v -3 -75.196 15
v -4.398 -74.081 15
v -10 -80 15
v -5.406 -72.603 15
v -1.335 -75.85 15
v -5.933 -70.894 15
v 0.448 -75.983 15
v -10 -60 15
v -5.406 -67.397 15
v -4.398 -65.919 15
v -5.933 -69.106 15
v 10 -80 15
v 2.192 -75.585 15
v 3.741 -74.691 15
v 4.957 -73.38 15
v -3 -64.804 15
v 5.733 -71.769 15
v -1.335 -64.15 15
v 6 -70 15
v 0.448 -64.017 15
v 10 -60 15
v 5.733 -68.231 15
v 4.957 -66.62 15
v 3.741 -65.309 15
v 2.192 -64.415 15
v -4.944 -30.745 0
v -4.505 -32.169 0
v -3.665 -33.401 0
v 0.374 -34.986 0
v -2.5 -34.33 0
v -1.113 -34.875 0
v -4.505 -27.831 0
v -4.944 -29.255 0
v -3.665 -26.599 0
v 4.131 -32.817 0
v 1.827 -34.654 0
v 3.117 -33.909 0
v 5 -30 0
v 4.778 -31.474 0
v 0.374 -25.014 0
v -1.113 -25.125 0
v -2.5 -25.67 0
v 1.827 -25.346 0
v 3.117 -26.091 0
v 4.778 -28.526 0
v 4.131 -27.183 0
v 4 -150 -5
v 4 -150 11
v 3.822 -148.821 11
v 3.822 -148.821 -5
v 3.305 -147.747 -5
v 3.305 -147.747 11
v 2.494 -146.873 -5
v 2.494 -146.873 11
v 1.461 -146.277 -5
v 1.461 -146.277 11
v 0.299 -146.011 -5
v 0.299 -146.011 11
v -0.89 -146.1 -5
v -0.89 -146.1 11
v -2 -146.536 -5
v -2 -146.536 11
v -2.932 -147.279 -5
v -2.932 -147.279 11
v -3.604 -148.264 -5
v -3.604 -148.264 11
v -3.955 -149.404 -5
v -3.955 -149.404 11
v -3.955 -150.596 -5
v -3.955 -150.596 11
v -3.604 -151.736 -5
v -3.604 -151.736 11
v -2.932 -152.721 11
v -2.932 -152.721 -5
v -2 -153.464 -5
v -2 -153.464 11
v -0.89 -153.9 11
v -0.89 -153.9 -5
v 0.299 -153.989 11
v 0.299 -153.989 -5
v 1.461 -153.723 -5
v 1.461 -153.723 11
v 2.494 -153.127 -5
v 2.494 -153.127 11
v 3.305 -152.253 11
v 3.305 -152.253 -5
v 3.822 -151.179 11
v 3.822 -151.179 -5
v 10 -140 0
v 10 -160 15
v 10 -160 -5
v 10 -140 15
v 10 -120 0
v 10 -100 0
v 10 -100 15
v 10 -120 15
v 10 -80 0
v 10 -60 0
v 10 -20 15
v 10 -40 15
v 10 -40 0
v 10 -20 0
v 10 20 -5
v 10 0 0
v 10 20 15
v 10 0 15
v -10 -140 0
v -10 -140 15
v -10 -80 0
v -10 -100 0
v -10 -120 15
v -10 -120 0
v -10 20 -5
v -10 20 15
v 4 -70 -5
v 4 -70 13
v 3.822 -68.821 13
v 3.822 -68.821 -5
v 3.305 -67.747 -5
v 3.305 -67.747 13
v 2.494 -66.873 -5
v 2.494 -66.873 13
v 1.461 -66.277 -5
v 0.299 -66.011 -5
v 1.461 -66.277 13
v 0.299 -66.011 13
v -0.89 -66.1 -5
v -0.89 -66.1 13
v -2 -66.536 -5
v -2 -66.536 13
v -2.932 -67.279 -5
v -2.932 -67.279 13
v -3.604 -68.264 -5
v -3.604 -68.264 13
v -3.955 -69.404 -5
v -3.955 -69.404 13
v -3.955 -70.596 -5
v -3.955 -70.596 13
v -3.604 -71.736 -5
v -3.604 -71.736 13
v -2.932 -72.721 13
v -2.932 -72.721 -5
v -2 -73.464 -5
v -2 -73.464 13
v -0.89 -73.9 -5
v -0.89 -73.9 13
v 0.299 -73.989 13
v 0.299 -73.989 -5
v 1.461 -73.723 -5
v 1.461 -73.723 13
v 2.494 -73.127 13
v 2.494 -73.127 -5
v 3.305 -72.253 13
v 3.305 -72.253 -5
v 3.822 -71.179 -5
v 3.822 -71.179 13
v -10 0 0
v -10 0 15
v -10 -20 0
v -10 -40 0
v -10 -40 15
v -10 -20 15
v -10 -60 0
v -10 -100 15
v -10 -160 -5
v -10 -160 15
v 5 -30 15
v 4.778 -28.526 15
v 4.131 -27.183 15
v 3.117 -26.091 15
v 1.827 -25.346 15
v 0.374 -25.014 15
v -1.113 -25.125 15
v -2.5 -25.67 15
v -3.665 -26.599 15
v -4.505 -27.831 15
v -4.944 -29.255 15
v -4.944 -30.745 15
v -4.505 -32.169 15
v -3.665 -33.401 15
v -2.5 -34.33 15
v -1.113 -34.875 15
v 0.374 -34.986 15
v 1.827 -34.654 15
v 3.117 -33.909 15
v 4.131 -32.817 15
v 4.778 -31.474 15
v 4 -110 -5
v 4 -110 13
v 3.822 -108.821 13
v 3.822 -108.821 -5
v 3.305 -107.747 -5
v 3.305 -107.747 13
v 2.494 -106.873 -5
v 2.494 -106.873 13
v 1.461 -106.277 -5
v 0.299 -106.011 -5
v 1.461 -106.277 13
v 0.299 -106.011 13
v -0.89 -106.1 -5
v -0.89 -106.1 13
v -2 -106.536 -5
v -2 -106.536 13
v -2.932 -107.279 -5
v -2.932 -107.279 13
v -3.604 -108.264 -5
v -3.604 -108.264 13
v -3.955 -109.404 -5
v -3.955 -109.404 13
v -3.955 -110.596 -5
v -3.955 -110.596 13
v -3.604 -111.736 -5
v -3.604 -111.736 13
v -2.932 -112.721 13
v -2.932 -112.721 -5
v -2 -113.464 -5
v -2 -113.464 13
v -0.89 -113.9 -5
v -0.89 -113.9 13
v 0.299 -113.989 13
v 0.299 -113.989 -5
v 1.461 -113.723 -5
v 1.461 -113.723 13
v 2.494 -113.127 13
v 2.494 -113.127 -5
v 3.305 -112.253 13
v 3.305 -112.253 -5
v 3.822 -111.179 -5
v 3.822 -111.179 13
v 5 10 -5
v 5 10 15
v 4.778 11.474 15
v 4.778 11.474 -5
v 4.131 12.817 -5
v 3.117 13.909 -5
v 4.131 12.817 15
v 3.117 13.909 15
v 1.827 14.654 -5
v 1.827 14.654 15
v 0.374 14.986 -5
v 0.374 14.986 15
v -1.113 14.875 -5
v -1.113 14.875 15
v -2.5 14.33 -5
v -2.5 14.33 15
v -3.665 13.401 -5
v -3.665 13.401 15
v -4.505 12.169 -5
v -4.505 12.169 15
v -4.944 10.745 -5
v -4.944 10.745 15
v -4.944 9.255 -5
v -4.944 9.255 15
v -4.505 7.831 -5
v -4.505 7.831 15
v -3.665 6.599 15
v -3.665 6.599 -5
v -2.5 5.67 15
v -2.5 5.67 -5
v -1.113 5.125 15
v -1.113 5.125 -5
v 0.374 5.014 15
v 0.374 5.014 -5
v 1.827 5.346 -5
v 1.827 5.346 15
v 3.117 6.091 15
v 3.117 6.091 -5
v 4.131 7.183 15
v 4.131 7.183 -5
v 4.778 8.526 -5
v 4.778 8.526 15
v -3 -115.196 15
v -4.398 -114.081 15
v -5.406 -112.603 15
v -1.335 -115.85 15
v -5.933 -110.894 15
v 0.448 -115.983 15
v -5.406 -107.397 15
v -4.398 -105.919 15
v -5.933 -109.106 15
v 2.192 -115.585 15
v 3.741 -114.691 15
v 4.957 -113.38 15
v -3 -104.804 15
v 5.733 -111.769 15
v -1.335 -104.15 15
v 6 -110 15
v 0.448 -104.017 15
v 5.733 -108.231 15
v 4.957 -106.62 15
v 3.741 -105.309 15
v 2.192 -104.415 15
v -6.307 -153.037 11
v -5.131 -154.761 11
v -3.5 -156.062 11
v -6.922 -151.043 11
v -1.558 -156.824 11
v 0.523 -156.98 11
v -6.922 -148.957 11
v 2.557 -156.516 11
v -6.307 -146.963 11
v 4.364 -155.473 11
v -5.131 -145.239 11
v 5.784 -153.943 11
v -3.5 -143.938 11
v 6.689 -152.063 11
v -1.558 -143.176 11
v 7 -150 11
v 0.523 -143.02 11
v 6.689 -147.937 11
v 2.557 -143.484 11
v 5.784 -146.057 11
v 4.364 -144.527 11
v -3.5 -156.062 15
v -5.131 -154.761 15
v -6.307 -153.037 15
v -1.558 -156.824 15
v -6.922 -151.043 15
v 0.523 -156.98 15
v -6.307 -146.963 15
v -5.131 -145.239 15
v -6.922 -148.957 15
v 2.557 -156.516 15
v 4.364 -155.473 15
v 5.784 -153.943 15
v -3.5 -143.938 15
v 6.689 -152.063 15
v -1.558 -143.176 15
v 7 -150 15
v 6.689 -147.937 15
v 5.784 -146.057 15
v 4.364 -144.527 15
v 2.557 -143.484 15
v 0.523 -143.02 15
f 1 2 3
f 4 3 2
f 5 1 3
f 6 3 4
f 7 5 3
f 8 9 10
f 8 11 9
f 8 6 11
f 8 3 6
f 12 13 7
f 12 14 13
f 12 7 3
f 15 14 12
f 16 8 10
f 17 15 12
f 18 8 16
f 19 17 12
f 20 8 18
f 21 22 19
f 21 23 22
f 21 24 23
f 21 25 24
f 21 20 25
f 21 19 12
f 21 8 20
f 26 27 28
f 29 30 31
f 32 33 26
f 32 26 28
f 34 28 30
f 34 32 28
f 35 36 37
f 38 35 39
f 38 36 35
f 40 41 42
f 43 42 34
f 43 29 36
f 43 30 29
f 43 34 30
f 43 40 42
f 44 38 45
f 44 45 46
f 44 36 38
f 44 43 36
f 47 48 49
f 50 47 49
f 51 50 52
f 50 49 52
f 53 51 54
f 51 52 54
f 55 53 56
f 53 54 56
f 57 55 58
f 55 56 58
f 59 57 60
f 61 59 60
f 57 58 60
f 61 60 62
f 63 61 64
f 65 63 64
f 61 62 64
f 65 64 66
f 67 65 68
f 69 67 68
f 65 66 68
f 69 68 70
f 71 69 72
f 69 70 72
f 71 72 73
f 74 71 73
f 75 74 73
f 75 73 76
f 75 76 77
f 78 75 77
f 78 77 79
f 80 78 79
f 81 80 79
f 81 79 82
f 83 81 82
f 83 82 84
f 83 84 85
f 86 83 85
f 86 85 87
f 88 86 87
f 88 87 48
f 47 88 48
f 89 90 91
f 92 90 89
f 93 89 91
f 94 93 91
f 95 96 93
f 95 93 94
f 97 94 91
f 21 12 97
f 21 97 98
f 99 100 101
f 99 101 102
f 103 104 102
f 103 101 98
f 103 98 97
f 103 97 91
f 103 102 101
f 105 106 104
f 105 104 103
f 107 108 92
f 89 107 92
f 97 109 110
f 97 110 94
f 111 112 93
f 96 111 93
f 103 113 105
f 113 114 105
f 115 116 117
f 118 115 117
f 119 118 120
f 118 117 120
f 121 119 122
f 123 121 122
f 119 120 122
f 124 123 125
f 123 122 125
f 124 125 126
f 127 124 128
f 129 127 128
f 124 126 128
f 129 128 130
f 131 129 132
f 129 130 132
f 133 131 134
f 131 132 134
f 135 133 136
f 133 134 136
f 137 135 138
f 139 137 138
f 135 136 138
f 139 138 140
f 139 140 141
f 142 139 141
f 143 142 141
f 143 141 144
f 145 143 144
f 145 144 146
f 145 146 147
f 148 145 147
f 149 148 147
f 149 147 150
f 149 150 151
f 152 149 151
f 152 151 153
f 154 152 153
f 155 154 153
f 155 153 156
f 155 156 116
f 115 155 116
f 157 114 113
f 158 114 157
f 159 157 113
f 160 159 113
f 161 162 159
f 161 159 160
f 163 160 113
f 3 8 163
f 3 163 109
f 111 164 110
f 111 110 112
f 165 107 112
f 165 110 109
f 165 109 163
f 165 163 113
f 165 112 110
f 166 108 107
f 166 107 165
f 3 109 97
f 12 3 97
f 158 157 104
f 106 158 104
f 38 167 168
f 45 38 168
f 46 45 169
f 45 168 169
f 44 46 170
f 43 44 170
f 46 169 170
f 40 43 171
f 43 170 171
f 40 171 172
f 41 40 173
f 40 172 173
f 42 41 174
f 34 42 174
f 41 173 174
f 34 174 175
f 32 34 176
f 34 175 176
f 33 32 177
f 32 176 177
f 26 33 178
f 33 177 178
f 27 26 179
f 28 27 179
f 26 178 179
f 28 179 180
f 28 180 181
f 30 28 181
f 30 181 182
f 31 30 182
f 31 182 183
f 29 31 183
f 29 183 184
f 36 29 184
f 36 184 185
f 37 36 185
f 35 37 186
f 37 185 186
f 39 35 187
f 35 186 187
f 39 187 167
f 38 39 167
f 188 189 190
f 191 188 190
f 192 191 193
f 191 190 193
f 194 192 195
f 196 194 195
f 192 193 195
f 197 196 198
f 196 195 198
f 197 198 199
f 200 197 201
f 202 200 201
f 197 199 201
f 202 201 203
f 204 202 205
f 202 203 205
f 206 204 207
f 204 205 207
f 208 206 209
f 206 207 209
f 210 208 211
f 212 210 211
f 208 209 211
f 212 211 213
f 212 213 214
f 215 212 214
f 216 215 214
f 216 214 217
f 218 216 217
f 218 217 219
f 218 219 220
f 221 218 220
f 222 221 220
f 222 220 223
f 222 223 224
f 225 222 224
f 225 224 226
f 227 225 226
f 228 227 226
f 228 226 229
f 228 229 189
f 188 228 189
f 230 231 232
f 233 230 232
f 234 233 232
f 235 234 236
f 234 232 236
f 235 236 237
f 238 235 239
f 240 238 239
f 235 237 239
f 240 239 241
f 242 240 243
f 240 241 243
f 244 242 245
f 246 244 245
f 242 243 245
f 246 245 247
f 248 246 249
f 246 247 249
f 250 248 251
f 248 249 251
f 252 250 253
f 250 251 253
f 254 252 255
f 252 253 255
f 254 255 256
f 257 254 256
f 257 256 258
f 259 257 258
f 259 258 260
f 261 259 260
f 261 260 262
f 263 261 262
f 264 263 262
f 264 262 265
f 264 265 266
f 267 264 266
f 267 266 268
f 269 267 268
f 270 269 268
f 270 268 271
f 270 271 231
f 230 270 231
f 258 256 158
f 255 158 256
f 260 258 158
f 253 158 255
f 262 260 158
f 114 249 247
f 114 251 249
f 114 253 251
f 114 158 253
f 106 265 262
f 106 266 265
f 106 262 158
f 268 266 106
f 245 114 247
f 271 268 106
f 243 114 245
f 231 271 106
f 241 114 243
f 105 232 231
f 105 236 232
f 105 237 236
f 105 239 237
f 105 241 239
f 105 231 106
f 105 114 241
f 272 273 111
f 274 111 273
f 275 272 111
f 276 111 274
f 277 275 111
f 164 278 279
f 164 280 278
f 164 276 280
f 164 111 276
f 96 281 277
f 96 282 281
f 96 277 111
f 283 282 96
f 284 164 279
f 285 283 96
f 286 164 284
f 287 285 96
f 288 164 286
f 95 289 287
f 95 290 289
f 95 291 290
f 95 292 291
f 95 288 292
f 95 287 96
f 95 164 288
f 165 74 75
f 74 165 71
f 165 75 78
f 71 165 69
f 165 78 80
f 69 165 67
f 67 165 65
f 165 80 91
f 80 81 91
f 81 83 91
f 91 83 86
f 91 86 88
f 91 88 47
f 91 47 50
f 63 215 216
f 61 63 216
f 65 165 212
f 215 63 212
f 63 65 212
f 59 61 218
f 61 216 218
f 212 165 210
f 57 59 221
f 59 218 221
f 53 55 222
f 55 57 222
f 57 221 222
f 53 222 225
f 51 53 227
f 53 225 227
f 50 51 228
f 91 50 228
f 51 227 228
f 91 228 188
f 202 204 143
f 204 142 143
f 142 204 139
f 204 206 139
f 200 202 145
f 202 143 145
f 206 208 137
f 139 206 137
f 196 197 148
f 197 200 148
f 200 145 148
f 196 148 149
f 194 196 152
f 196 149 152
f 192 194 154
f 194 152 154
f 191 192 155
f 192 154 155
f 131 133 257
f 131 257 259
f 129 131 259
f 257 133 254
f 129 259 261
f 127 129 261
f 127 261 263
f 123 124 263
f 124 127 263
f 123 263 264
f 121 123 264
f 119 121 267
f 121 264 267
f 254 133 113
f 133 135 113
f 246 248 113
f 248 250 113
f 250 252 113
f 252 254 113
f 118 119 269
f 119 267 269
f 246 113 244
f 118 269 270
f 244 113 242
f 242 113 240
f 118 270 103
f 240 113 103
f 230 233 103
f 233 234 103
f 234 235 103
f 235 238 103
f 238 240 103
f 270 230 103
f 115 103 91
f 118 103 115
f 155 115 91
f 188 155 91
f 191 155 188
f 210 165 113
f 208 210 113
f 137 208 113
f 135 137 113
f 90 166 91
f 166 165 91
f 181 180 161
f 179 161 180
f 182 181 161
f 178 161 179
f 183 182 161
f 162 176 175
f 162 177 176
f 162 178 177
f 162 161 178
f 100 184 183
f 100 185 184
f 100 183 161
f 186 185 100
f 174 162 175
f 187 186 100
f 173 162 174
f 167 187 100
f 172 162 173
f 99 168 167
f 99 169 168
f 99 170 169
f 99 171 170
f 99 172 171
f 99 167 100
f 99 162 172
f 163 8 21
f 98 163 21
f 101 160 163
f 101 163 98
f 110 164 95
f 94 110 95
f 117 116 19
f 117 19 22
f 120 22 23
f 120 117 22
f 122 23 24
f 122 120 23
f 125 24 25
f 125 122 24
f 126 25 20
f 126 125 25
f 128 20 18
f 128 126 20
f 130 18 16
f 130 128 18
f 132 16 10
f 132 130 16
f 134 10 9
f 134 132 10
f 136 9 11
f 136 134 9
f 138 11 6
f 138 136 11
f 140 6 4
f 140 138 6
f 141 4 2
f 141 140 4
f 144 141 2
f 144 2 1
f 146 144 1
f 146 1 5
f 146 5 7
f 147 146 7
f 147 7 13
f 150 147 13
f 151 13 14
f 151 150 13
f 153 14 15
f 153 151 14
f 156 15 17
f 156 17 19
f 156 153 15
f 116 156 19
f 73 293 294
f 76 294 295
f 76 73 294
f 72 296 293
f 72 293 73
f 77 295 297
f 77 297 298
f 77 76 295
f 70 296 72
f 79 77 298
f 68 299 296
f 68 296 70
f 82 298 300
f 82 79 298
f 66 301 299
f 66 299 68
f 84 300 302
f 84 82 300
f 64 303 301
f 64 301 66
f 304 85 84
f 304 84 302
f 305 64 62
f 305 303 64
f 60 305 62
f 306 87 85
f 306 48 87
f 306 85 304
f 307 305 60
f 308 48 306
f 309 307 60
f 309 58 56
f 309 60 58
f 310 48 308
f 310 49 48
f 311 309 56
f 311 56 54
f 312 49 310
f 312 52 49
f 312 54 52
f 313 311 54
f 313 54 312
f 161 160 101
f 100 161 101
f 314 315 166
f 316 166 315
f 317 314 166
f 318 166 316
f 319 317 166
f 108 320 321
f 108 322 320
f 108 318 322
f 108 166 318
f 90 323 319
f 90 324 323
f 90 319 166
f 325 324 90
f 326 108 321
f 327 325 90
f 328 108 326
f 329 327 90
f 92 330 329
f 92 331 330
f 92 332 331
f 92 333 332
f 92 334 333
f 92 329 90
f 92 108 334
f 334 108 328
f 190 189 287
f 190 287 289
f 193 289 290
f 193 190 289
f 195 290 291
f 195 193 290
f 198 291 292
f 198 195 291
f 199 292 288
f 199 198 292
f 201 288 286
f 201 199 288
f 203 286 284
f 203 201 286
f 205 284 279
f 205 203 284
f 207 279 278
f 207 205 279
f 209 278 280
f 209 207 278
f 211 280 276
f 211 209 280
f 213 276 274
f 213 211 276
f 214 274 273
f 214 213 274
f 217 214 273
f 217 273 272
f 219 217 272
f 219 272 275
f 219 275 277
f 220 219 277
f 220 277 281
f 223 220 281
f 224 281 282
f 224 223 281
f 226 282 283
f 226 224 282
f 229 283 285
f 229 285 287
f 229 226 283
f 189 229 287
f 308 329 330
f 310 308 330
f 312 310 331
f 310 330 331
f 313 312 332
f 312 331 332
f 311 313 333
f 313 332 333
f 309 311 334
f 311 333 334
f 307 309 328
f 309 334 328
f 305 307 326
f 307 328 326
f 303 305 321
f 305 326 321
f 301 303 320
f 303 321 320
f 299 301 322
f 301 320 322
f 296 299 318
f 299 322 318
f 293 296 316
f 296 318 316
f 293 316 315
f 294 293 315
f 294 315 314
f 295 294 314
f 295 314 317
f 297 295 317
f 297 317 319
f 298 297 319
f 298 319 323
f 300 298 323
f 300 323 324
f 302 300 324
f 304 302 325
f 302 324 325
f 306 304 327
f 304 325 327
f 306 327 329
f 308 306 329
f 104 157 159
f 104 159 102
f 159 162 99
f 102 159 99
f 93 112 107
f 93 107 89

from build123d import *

# Parameters (mm, degrees)
SKETCH_1_W               = 20
SKETCH_1_H               = 20
EXTRUDE_1_DEPTH          = 15
SKETCH_1_5_W             = 20
SKETCH_1_5_H             = 40
EXTRUDE_2_DEPTH          = 5
PATTERN_LINEAR_1_COUNT   = 5
PATTERN_LINEAR_1_PITCH   = 40
CUT_EXTRUDE_1_DEPTH      = 181.900525151
CUT_EXTRUDE_1_DEPTH_BACK = 181.900525151
SKETCH_2_W               = 20
SKETCH_2_H               = 20
SKETCH_3_R               = 5
CUT_EXTRUDE_2_DEPTH      = 162.554944214
SKETCH_4_R               = 5
CUT_EXTRUDE_3_DEPTH      = 15
SKETCH_5_R               = 4
CUT_EXTRUDE_4_DEPTH      = 162.554944214
CHAMFER_1_SIZE           = 2
CHAMFER_2_SIZE           = 2
SKETCH_6_R               = 7
CUT_EXTRUDE_5_DEPTH      = 4


with BuildPart() as part:
    # Эскиз1 → Бобышка-Вытянуть1 (new body)
    with BuildSketch(Plane.XY):
        with Locations((0, 10)):
            Rectangle(SKETCH_1_W, SKETCH_1_H)
    extrude(amount=EXTRUDE_1_DEPTH)

    # Эскиз1<5> → Бобышка-Вытянуть2 (add)
    with BuildSketch(Plane.XY):
        Rectangle(SKETCH_1_5_W, SKETCH_1_5_H)
    extrude(amount=-EXTRUDE_2_DEPTH)


with BuildPart() as pattern_linear_1_1:
    # Линейный массив1: pattern copy
    add(part.part.moved(Location(Vector(0, -1, 0) * (1 * PATTERN_LINEAR_1_PITCH))))

    # Эскиз4 → Вырез-Вытянуть3 (cut)
    with BuildSketch(Plane.XY.offset(15)):
        with Locations((0, -30)):
            Circle(SKETCH_4_R)
    extrude(amount=-CUT_EXTRUDE_3_DEPTH, mode=Mode.SUBTRACT)


with BuildPart() as pattern_linear_1_2:
    # Линейный массив1: pattern copy
    add(part.part.moved(Location(Vector(0, -1, 0) * (2 * PATTERN_LINEAR_1_PITCH))))


with BuildPart() as pattern_linear_1_3:
    # Линейный массив1: pattern copy
    add(part.part.moved(Location(Vector(0, -1, 0) * (3 * PATTERN_LINEAR_1_PITCH))))


with BuildPart() as pattern_linear_1_4:
    # Линейный массив1: pattern copy
    add(part.part.moved(Location(Vector(0, -1, 0) * (4 * PATTERN_LINEAR_1_PITCH))))

    # Эскиз2 → Вырез-Вытянуть1 (cut, two sides: drawn at the far end of the back side and taken through both)
    with BuildSketch(Plane.XY.offset(-CUT_EXTRUDE_1_DEPTH_BACK)):
        with Locations((0, -170)):
            Rectangle(SKETCH_2_W, SKETCH_2_H)
    extrude(amount=CUT_EXTRUDE_1_DEPTH + CUT_EXTRUDE_1_DEPTH_BACK, mode=Mode.SUBTRACT)


with BuildPart() as part_1:
    add(part.part)

    # Эскиз3 → Вырез-Вытянуть2 (cut, through all)
    with BuildSketch(Plane.XY.offset(15)):
        with Locations((0, 10)):
            Circle(SKETCH_3_R)
    extrude(amount=-CUT_EXTRUDE_2_DEPTH, mode=Mode.SUBTRACT)


with BuildPart() as cut_extrude_4_tool:
    # Эскиз5 → Вырез-Вытянуть4 (new, through all)
    with BuildSketch(Plane.XY.offset(15)):
        with Locations((0, -70)):
            Circle(SKETCH_5_R)
        with Locations((0, -110)):
            Circle(SKETCH_5_R)
        with Locations((0, -150)):
            Circle(SKETCH_5_R)
    extrude(amount=-CUT_EXTRUDE_4_DEPTH)


with BuildPart() as pattern_linear_1_2_1:
    add(pattern_linear_1_2.part)

    # Вырез-Вытянуть4: cut by cut_extrude_4_tool
    add(cut_extrude_4_tool.part, mode=Mode.SUBTRACT)

    # Фаска1
    chamfer_1_edges = [pattern_linear_1_2_1.edges().sort_by_distance(p)[0] for p in [
        (-4, -70, 15),
    ]]
    chamfer(chamfer_1_edges, length=CHAMFER_1_SIZE)


with BuildPart() as pattern_linear_1_3_1:
    add(pattern_linear_1_3.part)

    # Вырез-Вытянуть4: cut by cut_extrude_4_tool
    add(cut_extrude_4_tool.part, mode=Mode.SUBTRACT)

    # Фаска2
    chamfer_2_edges = [pattern_linear_1_3_1.edges().sort_by_distance(p)[0] for p in [
        (-4, -110, 15),
    ]]
    chamfer(chamfer_2_edges, length=CHAMFER_2_SIZE)


with BuildPart() as pattern_linear_1_4_1:
    add(pattern_linear_1_4.part)

    # Вырез-Вытянуть4: cut by cut_extrude_4_tool
    add(cut_extrude_4_tool.part, mode=Mode.SUBTRACT)

    # Эскиз6 → Вырез-Вытянуть5 (cut)
    with BuildSketch(Plane.XY.offset(15)):
        with Locations((0, -150)):
            Circle(SKETCH_6_R)
    extrude(amount=-CUT_EXTRUDE_5_DEPTH, mode=Mode.SUBTRACT)


with BuildPart() as part_2:
    add(part_1.part)

    # Combine 1: union Линейный массив1_1, Линейный массив1_2, Линейный массив1_3, Линейный массив1_4
    add(pattern_linear_1_1.part)
    add(pattern_linear_1_2_1.part)
    add(pattern_linear_1_3_1.part)
    add(pattern_linear_1_4_1.part)


solid = part_2.part
